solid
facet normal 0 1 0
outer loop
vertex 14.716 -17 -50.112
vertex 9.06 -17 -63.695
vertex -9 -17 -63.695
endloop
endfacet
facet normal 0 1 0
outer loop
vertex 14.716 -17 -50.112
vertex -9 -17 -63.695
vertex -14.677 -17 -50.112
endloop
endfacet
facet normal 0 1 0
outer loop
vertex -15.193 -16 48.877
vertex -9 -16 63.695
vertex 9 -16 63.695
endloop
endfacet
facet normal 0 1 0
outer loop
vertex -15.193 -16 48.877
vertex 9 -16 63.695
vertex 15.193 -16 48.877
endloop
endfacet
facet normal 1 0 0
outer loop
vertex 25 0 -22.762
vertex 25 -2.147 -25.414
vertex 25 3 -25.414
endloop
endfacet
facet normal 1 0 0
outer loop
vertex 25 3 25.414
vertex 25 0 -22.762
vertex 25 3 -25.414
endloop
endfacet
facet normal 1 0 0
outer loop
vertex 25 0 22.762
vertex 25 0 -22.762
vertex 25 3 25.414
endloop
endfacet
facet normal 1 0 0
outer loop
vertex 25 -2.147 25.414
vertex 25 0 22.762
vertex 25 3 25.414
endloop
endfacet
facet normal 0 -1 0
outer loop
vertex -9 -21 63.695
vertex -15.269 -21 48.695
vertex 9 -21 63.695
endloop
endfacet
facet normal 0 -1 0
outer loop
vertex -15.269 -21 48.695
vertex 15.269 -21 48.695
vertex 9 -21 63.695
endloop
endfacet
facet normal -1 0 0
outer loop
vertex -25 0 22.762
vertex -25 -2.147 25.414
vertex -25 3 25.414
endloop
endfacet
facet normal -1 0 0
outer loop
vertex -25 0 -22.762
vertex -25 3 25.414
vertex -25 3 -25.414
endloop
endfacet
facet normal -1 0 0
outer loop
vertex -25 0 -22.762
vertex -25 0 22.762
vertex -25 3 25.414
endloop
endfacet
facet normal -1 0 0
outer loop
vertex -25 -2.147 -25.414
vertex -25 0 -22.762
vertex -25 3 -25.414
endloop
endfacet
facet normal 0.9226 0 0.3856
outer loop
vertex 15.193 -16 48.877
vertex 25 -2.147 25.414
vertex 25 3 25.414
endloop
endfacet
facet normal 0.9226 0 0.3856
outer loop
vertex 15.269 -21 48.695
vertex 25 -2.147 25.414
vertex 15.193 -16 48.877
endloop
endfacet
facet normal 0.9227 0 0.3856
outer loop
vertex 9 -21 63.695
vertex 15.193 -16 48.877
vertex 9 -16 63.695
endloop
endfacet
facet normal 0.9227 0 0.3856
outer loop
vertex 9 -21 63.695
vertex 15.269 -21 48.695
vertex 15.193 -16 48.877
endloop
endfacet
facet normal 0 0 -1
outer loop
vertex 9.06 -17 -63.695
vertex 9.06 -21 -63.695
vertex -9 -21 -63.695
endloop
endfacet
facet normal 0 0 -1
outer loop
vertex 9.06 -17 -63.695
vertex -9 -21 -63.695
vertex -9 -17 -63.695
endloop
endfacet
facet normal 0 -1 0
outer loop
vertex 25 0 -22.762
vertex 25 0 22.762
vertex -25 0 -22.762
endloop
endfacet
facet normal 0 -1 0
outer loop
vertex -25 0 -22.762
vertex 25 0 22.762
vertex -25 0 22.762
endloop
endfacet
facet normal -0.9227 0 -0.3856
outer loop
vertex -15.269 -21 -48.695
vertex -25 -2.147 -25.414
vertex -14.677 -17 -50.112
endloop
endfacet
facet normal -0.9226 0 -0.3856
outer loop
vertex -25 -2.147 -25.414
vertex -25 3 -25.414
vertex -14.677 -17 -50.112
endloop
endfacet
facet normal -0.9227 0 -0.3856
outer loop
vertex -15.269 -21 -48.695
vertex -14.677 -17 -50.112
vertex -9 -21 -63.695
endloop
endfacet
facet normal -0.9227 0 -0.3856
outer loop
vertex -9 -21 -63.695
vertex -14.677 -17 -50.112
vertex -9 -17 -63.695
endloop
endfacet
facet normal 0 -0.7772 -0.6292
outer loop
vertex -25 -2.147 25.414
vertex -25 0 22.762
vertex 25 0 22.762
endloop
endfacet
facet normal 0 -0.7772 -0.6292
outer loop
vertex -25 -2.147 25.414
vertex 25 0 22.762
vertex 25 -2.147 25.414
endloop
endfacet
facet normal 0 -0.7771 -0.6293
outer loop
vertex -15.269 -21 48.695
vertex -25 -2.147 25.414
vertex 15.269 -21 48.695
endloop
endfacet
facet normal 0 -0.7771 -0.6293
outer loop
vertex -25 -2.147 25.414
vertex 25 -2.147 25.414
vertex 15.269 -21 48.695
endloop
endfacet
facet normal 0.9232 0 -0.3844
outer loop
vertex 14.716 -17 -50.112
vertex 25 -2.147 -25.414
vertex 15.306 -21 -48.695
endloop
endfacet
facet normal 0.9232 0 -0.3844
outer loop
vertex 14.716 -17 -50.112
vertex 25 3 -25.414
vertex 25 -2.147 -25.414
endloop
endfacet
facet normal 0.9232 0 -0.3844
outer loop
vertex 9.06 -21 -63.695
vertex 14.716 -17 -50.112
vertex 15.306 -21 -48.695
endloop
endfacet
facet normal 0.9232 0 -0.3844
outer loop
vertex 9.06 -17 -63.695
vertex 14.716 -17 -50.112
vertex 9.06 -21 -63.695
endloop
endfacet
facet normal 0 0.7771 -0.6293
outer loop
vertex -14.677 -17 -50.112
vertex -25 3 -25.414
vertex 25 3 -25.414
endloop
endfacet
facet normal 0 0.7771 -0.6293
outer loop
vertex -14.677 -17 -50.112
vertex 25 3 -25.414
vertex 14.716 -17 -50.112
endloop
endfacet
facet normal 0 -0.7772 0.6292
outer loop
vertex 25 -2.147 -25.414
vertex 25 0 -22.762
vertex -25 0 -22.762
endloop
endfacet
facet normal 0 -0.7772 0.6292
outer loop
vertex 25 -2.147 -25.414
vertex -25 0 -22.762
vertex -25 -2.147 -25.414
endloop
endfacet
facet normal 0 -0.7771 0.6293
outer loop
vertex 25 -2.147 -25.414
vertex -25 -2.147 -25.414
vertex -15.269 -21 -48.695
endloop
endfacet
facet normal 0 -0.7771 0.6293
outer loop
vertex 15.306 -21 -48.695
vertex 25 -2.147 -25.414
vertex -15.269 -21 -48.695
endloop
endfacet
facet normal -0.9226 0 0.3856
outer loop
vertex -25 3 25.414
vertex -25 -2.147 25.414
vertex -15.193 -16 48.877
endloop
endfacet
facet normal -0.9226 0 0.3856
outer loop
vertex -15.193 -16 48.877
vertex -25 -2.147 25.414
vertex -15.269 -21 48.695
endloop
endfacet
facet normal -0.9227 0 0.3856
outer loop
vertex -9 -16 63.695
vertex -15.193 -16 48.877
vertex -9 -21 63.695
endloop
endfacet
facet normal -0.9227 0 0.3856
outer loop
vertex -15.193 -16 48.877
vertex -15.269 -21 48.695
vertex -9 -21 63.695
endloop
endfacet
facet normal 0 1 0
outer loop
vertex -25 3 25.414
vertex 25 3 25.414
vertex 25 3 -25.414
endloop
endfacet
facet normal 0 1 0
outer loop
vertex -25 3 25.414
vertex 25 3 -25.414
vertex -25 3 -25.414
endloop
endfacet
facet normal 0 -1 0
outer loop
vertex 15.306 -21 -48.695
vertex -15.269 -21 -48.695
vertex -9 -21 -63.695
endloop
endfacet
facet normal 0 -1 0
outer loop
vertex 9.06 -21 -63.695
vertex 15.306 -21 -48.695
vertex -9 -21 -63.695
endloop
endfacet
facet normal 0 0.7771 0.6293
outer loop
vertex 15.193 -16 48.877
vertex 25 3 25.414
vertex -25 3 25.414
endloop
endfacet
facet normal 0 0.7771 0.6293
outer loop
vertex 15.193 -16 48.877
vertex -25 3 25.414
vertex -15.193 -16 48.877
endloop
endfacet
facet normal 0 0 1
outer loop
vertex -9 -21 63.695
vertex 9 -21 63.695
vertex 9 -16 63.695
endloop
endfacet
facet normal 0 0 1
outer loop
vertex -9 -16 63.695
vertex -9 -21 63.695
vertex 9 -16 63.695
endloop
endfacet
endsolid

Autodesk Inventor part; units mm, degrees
ref_plane "YZ Plane" through (0, 0, 0) normal (1, 0, 0) x (0, 1, 0)
ref_plane "XZ Plane" through (0, 0, 0) normal (0, 1, 0) x (-1, 0, 0)
ref_plane "XY Plane" through (0, 0, 0) normal (0, 0, 1) x (1, 0, 0)
sketch "Эскиз1" plane through (0, 0, 0) normal (0, 1, 0) x (-1, 0, 0)
  line L0 (-25, 22.7625) -> (25, 22.7625)
  line L1 (25, 22.7625) -> (25, -22.7625)
  line L2 (25, -22.7625) -> (-25, -22.7625)
  line L3 (-25, -22.7625) -> (-25, 22.7625)
  line L4 (-25, 22.7625) -> (25, -22.7625) construction
  line L5 (25, 22.7625) -> (-25, -22.7625) construction
  point P0 (0, 0)
  dimension "d0" = 50
  dimension "d1" = 45.525
extrude "Выдавливание1" add sketch "Эскиз1" along normal blind 3
sketch "Эскиз3" plane through (25, 0, 22.7625) normal (1, 0, 0) x (0, 0, -1)
  line L0 (45.525, 0) -> (0, 0) projected
  line L1 (0, 0) -> (0, -21)
  line L2 (45.525, 3) -> (0, 3) projected
  line L3 (0, -21) -> (-43.1562, -21)
  line L4 (0, -21) -> (135.6288, -21)
  line L5 (0, 0) -> (-25.9328, -21)
  line L6 (45.525, 0) -> (71.4578, -21)
  line L7 (71.4578, -21) -> (86.4578, -21)
  line L8 (86.4578, -21) -> (86.4578, -17)
  line L9 (86.4578, -17) -> (72.8743, -17)
  line L10 (-25.9328, -21) -> (-40.9328, -21)
  line L11 (-40.9328, -21) -> (-40.9328, -16)
  line L12 (-40.9328, -16) -> (-26.1144, -16)
  line L13 (-2.6514, 3) -> (-26.1144, -16)
  line L14 (0, 3) -> (-2.6514, 3)
  line L15 (48.1764, 3) -> (72.8743, -17)
  line L16 (45.525, 3) -> (48.1764, 3)
  line L17 (0, 3) -> (0, 0)
  line L18 (45.525, 0) -> (45.525, 3) projected
  line L19 (45.525, 3) -> (45.525, 0)
  line L20 (45.525, 3) -> (45.525, 0)
  point P0 (22.7625, 0)
  dimension "d4" = 21
  dimension "d7" = 15
  dimension "d8" = 4
  dimension "d9" = 15
  dimension "d10" = 5
  dimension "d11" = 4
  dimension "d12" = 4
extrude "Выдавливание2" add sketch "Эскиз3" against normal up to surface (50 mm away) contours L18 L16 L15 L9 L8 L4 L6 | L5 L3 L11 L12 L13 L14 L17
sketch "Эскиз4" plane through (25, -16, 63.6953) normal (0, 1, 0) x (1, 0, 0)
  line L0 (0, 89.1092) -> (0, 38.2815) projected
  line L1 (0, 38.2815) -> (-16, 0)
  line L2 (0, 0) -> (-50, 0) projected
  line L3 (-50, 38.2815) -> (-50, 14.8184) projected
  line L4 (-50, 38.2815) -> (-34, 0)
  line L5 (-50, 14.8184) -> (-50, 0) projected
  line L6 (0, 14.8184) -> (0, 0) projected
  line L7 (-16, 0) -> (0, 0)
  line L8 (0, 38.2815) -> (0, 0)
  line L9 (-34, 0) -> (-50, 0)
  line L10 (-50, 0) -> (-50, 38.2815)
  point P0 (-25, 63.6953)
  dimension "d15" = 16
  dimension "d16" = 16
extrude "Выдавливание3" cut sketch "Эскиз4" along normal mid plane 70
sketch "Эскиз5" plane through (0, 3, 0) normal (0, 1, 0) x (1, 0, 0)
  line L0 (-15.1935, -48.8769) -> (-9, -63.6953) projected
  line L1 (-25, 25.4139) -> (-25, -25.4139) projected
  line L2 (-25, 25.4139) -> (-9, 63.6953)
  line L3 (25, 63.6953) -> (-25, 63.6953) projected
  line L4 (25, 63.6953) -> (25, 50.1118) projected
  line L5 (25, 25.4139) -> (9.06, 63.6953)
  line L6 (-25, 25.4139) -> (-25, 63.6953)
  line L7 (-9, 63.6953) -> (-25, 63.6953)
  line L8 (25, 25.4139) -> (25, 63.6953)
  line L9 (25, 63.6953) -> (9.06, 63.6953)
  point P0 (0, 0)
extrude "Выдавливание4" cut sketch "Эскиз5" against normal blind 70
sketch "Эскиз7" plane through (0, 3, 0) normal (0, 1, 0) x (1, 0, 0)
  line L0 (25, -25.4139) -> (-25, -25.4139) projected
  line L1 (25, 25.4139) -> (-25, 25.4139) projected
  line L2 (-25, -25.4139) -> (25, 25.4139)
  line L3 (-25, 25.4139) -> (25, -25.4139)
  line L4 (-15.65, -17.15) -> (15.65, -17.15)
  line L5 (15.65, -17.15) -> (15.65, 17.15)
  line L6 (15.65, 17.15) -> (-15.65, 17.15)
  line L7 (-15.65, 17.15) -> (-15.65, -17.15)
  line L8 (-15.65, -17.15) -> (15.65, 17.15) construction
  line L9 (15.65, -17.15) -> (-15.65, 17.15) construction
  point P0 (0, 0)
  dimension "d21" = 31.3
  dimension "d22" = 34.3
